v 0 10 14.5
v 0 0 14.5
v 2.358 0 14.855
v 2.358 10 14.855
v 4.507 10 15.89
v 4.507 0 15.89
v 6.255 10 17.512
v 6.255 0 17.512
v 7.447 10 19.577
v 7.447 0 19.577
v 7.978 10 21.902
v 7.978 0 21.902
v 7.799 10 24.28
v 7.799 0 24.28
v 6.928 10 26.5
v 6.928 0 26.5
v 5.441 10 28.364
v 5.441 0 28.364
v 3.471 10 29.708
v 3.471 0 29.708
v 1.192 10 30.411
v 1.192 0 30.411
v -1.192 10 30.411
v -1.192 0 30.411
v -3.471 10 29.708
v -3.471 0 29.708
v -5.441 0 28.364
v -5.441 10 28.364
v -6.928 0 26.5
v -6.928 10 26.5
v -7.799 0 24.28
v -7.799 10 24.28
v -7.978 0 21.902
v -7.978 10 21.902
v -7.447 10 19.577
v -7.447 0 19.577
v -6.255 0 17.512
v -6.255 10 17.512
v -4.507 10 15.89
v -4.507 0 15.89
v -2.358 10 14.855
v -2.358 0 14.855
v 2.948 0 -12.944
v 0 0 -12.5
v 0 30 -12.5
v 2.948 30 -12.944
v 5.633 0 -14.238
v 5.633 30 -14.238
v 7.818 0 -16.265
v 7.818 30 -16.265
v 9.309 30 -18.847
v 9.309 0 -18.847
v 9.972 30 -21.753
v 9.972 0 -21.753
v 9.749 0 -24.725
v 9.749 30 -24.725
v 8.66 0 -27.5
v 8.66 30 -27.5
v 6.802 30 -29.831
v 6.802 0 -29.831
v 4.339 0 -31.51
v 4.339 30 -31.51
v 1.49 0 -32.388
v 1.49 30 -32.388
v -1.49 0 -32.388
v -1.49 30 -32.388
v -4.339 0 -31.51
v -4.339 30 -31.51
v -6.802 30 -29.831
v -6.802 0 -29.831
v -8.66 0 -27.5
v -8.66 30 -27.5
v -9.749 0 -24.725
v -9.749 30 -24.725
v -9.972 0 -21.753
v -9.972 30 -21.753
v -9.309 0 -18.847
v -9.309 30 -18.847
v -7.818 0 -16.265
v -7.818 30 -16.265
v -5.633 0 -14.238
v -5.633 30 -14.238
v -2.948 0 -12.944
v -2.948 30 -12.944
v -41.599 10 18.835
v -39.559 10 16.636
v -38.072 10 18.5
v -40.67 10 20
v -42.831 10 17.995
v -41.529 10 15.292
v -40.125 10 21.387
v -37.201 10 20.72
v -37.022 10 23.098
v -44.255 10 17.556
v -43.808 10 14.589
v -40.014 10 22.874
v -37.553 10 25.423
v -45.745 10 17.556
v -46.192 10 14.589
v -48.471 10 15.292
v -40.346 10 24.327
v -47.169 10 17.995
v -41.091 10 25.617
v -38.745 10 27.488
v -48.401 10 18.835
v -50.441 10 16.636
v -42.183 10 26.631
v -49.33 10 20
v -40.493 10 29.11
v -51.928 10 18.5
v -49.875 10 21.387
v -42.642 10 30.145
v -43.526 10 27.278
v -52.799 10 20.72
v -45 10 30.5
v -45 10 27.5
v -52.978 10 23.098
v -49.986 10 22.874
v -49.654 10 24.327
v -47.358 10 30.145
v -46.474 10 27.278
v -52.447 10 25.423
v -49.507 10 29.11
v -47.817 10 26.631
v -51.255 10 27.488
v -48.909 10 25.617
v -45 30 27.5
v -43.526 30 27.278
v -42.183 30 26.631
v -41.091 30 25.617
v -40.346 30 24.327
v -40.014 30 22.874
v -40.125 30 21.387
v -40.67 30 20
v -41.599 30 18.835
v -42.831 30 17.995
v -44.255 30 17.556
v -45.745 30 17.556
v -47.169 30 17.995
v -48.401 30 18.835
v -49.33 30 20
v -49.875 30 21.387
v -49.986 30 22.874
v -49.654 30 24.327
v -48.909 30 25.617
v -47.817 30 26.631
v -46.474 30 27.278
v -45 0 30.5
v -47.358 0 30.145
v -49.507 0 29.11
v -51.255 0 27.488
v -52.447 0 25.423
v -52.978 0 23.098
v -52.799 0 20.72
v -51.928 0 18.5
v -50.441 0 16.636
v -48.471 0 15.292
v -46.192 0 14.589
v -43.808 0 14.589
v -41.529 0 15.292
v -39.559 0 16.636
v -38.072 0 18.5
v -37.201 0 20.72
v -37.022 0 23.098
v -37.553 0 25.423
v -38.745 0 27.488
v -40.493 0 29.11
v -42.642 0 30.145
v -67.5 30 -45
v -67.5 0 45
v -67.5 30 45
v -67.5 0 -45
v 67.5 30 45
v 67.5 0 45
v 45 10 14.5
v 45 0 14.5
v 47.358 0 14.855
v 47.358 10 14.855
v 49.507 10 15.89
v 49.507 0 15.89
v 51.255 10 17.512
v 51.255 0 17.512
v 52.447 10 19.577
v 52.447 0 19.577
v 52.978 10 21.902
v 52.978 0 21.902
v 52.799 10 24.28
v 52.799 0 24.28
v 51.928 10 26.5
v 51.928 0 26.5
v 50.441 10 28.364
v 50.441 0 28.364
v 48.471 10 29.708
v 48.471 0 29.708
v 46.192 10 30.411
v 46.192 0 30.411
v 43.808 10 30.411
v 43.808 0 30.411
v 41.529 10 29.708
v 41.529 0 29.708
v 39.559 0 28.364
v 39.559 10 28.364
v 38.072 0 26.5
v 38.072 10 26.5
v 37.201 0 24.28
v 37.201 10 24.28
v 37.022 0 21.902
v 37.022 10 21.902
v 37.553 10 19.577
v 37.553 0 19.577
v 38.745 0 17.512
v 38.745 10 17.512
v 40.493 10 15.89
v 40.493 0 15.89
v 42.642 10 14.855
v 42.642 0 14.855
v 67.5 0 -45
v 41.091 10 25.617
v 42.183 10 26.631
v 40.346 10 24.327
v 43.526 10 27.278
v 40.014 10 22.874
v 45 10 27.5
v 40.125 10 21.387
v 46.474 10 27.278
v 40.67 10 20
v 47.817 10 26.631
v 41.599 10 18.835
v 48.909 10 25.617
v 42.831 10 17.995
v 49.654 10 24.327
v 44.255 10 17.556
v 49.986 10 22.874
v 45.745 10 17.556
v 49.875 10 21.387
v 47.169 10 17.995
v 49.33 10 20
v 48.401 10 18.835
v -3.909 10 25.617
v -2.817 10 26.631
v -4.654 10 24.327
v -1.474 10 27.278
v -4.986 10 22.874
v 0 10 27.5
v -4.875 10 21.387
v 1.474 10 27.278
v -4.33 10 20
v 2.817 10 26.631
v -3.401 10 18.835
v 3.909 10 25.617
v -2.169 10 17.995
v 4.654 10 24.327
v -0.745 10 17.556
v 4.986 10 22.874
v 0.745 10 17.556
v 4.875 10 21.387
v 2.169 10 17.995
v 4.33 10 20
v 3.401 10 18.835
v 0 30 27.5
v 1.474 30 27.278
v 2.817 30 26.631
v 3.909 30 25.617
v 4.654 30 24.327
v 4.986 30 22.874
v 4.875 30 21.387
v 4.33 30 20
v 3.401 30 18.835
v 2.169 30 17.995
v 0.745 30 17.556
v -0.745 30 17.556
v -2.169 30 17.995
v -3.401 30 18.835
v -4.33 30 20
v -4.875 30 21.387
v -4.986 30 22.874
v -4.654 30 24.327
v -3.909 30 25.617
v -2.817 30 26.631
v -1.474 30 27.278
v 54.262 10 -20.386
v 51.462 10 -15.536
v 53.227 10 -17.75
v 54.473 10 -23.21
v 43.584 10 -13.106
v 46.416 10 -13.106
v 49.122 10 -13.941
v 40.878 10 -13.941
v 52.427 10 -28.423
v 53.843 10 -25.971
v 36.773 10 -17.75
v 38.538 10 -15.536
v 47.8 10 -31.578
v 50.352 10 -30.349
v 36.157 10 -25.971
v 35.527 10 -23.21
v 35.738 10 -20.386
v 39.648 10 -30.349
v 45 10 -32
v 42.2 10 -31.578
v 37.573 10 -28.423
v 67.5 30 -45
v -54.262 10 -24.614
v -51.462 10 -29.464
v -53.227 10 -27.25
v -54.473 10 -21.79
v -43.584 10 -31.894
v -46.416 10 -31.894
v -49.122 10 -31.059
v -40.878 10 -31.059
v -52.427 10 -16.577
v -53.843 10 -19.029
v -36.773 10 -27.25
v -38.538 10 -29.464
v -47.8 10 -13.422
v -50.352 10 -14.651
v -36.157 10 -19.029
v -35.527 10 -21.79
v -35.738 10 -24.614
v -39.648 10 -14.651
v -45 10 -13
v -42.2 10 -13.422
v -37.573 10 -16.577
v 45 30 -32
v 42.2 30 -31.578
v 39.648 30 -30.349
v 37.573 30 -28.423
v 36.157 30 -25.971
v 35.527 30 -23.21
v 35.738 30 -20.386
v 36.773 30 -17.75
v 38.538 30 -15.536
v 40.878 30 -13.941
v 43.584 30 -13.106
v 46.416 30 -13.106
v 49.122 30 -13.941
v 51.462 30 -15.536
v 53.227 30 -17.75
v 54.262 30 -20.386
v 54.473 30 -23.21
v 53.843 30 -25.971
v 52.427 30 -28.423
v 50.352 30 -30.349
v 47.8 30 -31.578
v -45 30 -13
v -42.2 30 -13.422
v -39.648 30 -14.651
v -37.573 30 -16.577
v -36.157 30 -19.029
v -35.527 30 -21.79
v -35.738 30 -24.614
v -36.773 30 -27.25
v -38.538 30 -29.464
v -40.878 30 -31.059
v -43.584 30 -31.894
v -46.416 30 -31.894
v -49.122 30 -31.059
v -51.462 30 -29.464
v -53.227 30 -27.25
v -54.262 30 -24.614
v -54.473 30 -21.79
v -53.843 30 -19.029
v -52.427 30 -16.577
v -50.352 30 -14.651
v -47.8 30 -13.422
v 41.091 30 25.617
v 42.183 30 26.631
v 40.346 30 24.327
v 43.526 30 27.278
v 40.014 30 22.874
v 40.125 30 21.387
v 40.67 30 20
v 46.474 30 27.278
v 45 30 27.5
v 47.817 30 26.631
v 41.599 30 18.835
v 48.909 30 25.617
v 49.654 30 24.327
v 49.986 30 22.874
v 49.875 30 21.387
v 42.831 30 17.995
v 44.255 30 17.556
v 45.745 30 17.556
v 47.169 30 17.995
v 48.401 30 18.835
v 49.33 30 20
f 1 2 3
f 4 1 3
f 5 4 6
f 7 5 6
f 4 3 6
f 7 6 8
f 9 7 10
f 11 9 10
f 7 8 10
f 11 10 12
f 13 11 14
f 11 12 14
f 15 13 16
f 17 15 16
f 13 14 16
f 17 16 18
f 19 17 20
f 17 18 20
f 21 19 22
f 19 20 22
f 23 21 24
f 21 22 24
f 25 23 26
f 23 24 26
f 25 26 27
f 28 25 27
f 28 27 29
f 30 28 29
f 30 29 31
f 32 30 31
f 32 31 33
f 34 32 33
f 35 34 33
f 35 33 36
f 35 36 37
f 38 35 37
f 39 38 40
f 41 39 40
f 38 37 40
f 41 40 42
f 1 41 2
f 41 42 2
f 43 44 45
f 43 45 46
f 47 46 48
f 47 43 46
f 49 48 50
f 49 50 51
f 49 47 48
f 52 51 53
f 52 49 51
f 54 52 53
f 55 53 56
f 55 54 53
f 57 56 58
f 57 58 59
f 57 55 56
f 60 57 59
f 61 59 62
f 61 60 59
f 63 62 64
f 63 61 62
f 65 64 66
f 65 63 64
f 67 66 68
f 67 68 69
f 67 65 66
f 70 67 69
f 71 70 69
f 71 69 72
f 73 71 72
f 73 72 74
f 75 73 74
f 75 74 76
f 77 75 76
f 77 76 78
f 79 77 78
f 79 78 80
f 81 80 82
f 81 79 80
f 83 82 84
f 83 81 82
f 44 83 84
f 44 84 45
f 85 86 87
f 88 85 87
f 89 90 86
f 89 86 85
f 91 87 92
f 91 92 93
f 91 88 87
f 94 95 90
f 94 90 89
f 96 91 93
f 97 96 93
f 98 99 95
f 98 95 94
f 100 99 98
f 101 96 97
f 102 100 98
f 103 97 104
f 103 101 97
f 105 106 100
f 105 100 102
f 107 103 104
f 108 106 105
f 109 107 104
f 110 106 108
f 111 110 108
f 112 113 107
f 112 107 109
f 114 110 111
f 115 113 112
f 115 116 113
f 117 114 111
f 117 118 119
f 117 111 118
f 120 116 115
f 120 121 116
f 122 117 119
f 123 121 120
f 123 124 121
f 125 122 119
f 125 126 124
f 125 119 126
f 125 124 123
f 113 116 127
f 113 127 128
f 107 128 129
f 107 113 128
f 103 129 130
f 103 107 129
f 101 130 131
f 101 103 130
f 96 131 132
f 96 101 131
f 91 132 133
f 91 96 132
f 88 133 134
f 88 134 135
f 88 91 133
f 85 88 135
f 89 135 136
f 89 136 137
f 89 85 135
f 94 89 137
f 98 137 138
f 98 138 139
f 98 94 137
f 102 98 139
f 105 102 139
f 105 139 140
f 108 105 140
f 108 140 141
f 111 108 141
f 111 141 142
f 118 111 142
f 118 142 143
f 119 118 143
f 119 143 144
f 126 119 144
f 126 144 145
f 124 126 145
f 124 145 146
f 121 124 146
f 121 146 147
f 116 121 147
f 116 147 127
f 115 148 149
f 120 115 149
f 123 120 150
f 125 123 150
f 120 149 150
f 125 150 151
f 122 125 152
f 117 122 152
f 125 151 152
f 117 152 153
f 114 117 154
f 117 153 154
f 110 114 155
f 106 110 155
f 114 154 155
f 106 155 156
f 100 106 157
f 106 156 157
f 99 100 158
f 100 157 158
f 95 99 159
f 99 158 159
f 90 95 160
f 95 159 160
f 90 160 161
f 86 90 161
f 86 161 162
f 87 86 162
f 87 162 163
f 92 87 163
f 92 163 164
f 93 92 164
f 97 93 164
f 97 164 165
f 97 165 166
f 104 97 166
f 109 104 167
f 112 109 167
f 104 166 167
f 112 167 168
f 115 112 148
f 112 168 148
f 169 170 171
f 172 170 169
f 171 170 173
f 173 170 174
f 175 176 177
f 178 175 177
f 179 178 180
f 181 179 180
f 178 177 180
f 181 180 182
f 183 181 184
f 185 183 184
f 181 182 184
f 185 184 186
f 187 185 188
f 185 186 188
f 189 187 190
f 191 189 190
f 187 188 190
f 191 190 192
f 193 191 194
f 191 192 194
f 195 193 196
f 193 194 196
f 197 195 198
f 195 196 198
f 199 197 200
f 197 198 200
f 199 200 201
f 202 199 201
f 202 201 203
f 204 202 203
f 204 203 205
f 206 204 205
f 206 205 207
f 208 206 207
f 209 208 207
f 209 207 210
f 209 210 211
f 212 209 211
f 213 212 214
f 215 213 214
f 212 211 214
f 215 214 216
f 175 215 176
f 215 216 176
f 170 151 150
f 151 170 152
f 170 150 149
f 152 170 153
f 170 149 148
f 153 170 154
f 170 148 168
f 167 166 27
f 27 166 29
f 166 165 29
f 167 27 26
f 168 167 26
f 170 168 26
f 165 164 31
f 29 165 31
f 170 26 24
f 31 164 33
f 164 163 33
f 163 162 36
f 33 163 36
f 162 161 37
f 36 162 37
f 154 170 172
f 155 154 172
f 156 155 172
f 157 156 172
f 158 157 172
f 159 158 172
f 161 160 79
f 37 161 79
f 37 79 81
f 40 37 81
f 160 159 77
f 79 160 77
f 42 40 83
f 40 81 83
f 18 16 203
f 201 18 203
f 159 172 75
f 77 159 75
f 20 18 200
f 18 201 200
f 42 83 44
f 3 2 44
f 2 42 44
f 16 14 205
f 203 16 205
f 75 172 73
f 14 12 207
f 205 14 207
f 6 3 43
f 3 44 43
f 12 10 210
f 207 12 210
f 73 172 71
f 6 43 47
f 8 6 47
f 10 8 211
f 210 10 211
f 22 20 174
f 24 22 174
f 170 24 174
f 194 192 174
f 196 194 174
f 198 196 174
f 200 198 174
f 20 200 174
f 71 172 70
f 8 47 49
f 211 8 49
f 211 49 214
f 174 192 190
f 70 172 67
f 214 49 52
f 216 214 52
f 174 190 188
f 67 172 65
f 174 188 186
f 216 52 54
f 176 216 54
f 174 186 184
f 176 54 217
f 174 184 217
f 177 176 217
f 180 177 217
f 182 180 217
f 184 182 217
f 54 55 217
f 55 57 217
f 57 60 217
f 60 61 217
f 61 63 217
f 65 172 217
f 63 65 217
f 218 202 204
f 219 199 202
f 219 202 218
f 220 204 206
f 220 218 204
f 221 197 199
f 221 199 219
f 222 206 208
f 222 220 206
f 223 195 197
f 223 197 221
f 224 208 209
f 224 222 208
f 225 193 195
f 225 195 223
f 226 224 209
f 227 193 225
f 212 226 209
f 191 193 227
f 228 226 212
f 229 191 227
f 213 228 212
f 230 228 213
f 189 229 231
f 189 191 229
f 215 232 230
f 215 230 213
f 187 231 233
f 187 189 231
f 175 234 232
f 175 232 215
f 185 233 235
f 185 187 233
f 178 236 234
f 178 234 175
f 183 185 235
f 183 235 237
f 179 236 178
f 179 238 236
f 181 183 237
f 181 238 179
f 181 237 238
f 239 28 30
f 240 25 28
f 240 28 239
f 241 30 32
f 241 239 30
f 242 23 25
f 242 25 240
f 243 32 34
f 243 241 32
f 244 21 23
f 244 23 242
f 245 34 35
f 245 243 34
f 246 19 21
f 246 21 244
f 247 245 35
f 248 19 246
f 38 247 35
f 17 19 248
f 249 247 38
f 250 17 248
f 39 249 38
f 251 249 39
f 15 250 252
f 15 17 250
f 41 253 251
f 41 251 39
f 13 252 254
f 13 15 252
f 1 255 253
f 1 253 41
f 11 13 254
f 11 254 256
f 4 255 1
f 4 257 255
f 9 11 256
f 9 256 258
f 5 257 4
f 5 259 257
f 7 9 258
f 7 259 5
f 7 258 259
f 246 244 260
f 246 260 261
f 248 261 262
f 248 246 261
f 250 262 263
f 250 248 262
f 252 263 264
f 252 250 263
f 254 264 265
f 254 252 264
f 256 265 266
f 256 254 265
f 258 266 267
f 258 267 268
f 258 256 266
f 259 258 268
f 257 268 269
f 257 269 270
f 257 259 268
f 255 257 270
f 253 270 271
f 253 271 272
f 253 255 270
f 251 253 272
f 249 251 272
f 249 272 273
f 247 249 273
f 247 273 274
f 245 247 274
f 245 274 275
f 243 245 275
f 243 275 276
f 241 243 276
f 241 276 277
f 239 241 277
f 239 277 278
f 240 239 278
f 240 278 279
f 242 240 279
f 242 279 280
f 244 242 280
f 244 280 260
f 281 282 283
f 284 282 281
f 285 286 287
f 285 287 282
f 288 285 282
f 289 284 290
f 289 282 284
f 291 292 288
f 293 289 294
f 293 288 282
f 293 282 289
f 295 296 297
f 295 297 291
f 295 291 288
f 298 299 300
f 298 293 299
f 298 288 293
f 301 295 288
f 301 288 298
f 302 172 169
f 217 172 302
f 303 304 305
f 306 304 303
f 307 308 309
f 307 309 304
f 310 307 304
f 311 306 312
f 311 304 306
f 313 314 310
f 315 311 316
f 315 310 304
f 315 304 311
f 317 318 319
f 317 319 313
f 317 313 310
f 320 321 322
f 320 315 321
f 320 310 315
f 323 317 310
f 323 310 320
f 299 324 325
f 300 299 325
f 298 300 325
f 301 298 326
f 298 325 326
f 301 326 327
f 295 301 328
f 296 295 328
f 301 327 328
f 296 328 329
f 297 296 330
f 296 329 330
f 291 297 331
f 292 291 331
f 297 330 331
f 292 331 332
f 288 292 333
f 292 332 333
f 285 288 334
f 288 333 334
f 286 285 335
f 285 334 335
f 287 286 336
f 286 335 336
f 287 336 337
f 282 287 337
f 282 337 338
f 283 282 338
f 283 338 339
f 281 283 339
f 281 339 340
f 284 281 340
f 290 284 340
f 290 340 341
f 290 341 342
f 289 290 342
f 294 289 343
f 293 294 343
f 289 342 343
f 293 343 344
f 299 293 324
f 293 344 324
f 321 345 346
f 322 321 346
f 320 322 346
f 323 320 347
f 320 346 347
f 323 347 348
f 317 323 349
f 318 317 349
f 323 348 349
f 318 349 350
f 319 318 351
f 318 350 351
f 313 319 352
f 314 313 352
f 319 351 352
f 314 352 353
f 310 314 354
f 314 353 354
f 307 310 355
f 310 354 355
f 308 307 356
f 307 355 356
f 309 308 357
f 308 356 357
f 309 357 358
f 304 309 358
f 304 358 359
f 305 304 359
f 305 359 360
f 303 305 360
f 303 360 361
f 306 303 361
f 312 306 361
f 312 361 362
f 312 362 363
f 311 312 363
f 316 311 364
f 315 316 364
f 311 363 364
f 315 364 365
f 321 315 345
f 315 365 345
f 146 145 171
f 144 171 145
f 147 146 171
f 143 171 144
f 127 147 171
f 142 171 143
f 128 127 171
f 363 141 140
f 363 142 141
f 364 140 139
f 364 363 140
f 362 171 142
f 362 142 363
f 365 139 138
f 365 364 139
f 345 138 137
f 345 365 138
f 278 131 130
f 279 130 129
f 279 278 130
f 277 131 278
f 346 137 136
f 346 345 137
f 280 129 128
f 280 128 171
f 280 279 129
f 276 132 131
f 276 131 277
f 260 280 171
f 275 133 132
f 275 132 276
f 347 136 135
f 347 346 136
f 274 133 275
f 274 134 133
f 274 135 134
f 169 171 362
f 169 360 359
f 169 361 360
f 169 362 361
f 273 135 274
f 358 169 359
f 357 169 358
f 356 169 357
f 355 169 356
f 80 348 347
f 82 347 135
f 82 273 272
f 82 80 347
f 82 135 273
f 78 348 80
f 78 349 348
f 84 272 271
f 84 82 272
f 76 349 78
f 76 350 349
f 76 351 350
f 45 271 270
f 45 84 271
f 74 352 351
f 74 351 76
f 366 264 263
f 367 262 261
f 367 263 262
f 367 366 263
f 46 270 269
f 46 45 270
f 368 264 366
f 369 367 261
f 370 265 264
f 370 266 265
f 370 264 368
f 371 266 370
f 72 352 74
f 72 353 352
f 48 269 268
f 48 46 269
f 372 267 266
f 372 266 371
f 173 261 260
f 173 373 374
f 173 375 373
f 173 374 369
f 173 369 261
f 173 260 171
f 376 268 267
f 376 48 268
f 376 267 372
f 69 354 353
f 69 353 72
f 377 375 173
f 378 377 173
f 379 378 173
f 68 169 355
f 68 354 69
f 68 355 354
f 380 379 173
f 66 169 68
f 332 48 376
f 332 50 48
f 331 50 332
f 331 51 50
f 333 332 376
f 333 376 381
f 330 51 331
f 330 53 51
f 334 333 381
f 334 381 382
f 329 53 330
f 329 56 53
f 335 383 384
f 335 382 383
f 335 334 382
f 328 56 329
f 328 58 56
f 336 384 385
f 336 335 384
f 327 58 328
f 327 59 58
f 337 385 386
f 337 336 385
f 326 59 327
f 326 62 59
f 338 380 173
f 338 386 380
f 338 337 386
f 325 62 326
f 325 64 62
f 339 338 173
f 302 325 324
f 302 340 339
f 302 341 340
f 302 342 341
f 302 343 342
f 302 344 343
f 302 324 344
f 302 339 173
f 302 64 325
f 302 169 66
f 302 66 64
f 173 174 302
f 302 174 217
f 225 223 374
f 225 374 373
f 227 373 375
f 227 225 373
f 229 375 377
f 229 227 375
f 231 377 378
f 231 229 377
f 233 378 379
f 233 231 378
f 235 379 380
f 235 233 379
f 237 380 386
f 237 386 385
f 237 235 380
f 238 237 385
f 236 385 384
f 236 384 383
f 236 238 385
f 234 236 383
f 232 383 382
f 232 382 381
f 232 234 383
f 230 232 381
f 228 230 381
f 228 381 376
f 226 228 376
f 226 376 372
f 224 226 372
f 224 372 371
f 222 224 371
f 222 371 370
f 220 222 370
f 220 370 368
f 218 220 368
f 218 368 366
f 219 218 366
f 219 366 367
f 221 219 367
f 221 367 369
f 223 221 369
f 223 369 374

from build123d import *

# Parameters (mm, degrees)
SKETCH1_W           = 135
SKETCH1_H           = 90
SKETCH1_R           = 10
SKETCH1_R_2         = 5
BOSS_EXTRUDE2_DEPTH = 30
SKETCH2_R           = 9.5
CUT_EXTRUDE2_DEPTH  = 20
SKETCH3_R           = 8
CUT_EXTRUDE3_DEPTH  = 10


with BuildPart() as part:
    # Sketch1 → Boss-Extrude2 (new body)
    with BuildSketch(Plane(origin=(0, 0, 0), x_dir=(1, 0, 0), z_dir=(0, 1, 0))):
        Rectangle(SKETCH1_W, SKETCH1_H)
        with Locations(Location((0, 22.5, 0), (0, 0, 270))):
            Circle(SKETCH1_R, mode=Mode.SUBTRACT)
        with Locations(Location((0, -22.5, 0), (0, 0, 270))):
            Circle(SKETCH1_R_2, mode=Mode.SUBTRACT)
        with Locations(Location((-45, -22.5, 0), (0, 0, 270))):
            Circle(SKETCH1_R_2, mode=Mode.SUBTRACT)
        with Locations(Location((45, -22.5, 0), (0, 0, 270))):
            Circle(SKETCH1_R_2, mode=Mode.SUBTRACT)
    extrude(amount=BOSS_EXTRUDE2_DEPTH)

    # Sketch2 → Cut-Extrude2 (cut)
    with BuildSketch(Plane(origin=(0, 30, 0), x_dir=(1, 0, 0), z_dir=(0, 1, 0))):
        with Locations(Location((-45, 22.5, 0), (0, 0, 270))):
            Circle(SKETCH2_R)
        with Locations(Location((45, 22.5, 0), (0, 0, 90))):
            Circle(SKETCH2_R)
    extrude(amount=-CUT_EXTRUDE2_DEPTH, mode=Mode.SUBTRACT)

    # Sketch3 → Cut-Extrude3 (cut)
    with BuildSketch(Plane.XZ):
        with Locations(Location((45, 22.5, 0), (0, 0, 270))):
            Circle(SKETCH3_R)
        with Locations(Location((0, 22.5, 0), (0, 0, 270))):
            Circle(SKETCH3_R)
        with Locations(Location((-45, 22.5, 0), (0, 0, 90))):
            Circle(SKETCH3_R)
    extrude(amount=-CUT_EXTRUDE3_DEPTH, mode=Mode.SUBTRACT)


solid = part.part
